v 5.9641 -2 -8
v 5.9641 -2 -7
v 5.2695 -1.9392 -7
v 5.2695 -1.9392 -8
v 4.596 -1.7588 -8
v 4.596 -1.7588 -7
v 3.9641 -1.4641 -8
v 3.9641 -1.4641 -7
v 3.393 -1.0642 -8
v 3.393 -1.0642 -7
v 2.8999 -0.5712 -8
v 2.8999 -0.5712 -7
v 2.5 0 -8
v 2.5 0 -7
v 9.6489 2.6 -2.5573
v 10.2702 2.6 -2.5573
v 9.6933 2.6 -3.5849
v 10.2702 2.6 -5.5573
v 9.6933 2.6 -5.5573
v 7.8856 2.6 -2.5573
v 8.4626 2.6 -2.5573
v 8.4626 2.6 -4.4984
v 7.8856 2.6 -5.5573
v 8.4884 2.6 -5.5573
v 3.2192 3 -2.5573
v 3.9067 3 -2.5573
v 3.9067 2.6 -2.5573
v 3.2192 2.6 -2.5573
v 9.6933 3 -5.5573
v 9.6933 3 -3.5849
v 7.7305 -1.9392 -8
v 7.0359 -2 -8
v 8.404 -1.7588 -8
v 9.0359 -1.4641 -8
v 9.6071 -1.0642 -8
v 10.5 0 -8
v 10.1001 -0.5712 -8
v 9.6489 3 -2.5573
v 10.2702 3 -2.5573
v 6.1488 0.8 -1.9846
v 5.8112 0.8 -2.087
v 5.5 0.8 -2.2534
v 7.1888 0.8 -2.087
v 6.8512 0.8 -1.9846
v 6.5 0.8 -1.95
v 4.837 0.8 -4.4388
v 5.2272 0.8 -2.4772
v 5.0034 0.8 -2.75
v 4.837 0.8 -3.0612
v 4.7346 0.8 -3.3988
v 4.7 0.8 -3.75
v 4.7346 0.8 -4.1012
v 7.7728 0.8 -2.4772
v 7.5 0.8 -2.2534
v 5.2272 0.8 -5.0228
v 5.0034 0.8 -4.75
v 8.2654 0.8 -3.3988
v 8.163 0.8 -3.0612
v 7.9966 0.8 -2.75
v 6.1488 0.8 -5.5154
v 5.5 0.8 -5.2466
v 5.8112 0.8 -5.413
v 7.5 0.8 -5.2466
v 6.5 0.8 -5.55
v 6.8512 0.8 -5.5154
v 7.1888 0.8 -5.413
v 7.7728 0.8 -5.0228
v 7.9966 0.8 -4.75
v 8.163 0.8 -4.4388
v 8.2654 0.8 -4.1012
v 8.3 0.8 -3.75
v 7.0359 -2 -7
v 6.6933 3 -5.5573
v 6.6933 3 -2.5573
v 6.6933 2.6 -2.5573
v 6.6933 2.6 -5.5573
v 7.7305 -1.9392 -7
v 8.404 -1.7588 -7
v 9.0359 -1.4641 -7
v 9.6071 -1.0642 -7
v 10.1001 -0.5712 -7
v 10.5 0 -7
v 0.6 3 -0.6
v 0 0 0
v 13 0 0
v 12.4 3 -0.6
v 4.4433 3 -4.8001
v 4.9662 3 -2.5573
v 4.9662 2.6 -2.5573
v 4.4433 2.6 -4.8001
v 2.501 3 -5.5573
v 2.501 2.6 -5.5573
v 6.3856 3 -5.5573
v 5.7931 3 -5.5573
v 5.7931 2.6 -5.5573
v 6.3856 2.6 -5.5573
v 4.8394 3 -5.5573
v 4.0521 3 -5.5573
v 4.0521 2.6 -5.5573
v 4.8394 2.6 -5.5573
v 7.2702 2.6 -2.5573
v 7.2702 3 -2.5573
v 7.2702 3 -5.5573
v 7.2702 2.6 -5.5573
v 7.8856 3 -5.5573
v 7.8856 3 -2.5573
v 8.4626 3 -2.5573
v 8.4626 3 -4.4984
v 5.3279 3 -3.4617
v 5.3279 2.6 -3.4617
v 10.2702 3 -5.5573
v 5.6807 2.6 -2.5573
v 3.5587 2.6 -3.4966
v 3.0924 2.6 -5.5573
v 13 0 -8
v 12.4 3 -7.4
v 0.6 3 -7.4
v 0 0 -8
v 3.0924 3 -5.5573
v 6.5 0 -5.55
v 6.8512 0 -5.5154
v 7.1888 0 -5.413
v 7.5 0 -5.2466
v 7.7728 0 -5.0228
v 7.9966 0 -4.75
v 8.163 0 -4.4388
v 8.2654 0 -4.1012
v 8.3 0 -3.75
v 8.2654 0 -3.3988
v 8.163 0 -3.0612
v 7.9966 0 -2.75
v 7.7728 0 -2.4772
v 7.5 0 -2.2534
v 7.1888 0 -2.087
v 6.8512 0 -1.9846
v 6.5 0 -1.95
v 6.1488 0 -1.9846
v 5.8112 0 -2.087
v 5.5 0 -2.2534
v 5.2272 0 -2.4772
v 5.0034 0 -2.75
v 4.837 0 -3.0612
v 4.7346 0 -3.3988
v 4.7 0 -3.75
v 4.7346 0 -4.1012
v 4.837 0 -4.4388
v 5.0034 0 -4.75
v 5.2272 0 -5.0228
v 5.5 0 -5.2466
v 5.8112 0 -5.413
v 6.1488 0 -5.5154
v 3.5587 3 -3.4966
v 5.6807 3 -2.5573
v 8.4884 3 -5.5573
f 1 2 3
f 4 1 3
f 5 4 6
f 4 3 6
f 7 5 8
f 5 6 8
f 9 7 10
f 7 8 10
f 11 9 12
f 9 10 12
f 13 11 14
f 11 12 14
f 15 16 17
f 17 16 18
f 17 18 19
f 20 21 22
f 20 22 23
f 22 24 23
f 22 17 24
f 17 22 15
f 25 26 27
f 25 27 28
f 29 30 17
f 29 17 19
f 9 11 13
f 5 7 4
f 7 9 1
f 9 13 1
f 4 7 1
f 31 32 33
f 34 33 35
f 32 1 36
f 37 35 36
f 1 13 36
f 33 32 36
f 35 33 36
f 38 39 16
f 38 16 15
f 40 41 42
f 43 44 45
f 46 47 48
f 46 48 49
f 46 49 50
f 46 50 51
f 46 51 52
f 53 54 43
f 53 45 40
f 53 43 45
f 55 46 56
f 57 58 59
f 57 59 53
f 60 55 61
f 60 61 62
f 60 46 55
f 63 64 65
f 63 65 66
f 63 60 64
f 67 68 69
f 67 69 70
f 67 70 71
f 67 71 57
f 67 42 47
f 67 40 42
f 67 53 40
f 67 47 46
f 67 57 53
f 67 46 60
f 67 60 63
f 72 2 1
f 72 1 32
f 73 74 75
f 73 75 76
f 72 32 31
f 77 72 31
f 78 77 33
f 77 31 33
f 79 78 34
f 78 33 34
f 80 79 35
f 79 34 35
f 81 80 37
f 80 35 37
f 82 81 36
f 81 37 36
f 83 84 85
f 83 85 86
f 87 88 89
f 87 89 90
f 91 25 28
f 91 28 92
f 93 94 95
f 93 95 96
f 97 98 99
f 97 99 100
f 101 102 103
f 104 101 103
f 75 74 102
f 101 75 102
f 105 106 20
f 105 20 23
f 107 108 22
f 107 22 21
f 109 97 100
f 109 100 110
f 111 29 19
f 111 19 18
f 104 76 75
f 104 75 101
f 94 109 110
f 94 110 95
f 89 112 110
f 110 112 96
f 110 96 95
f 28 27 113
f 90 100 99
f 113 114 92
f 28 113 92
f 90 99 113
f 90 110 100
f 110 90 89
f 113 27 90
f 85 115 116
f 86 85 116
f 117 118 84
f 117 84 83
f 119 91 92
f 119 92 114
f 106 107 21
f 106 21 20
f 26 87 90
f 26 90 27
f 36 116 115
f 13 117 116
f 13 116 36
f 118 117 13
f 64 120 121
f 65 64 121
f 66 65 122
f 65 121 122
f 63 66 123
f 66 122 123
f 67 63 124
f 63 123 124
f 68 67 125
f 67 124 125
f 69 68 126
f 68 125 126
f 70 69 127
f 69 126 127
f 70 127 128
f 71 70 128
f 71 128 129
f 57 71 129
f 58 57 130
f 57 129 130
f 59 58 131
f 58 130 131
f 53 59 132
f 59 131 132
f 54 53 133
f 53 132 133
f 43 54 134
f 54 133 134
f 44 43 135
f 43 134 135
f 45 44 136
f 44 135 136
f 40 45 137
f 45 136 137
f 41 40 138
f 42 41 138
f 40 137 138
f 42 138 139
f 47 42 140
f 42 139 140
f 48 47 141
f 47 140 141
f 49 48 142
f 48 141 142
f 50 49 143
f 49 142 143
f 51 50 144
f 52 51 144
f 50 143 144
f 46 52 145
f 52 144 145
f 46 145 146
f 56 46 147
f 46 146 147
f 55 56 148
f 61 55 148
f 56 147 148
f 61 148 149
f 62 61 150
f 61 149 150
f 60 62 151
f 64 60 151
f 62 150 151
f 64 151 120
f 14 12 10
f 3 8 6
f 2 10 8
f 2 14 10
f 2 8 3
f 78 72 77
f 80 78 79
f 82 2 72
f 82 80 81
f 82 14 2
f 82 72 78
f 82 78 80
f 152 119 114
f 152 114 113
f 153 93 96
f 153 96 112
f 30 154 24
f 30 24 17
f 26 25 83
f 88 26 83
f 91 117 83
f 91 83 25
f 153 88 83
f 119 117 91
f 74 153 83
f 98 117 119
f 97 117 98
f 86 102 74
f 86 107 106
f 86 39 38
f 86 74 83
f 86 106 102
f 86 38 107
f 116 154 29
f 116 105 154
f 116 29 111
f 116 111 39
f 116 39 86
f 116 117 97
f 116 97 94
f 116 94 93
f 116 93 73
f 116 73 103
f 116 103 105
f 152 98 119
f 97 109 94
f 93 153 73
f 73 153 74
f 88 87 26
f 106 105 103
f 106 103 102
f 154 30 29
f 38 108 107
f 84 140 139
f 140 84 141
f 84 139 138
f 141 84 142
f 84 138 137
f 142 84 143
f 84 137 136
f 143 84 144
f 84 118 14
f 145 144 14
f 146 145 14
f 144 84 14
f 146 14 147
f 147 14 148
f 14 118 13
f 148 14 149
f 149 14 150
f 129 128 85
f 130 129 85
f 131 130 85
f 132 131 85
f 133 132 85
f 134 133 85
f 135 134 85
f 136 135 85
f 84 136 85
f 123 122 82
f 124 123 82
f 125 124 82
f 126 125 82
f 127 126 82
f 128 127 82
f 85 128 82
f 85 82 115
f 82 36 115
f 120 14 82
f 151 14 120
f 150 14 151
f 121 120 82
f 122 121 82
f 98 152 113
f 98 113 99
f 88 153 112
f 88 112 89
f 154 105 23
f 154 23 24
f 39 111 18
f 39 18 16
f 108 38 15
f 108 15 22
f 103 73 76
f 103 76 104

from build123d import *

# Parameters (mm, degrees)
SKETCH1_W               = 13
SKETCH1_H               = 8
BOSS_EXTRUDE1_DEPTH     = 3
CUT_EXTRUDE1_DEPTH      = 16.556349186
CUT_EXTRUDE1_DEPTH_BACK = 16.556349186
CUT_EXTRUDE2_DEPTH      = 16.556349186
CUT_EXTRUDE2_DEPTH_BACK = 16.556349186
SKETCH4_R               = 1.8
CUT_EXTRUDE3_DEPTH      = 0.8
SKETCH5_W               = 8
SKETCH5_H               = 1
BOSS_EXTRUDE2_DEPTH     = 2
FILLET1_R               = 4
SKETCH6_W               = 0.576923077
SKETCH6_H               = 3
CUT_EXTRUDE4_DEPTH      = 0.4


with BuildPart() as part:
    # Sketch1 → Boss-Extrude1 (new body)
    with BuildSketch(Plane(origin=(0, 0, 0), x_dir=(1, 0, 0), z_dir=(0, 1, 0))):
        with Locations((6.5, 4)):
            Rectangle(SKETCH1_W, SKETCH1_H)
    extrude(amount=BOSS_EXTRUDE1_DEPTH)

    # Sketch2 → Cut-Extrude1 (cut, two sides: drawn at the far end of the back side and taken through both)
    with BuildSketch(Plane.XY.offset(-CUT_EXTRUDE1_DEPTH_BACK)):
        Polygon((0, 0), (0.6, 3), (0, 3), align=None)
        Polygon((13, 0), (12.4, 3), (13, 3), align=None)
    extrude(amount=CUT_EXTRUDE1_DEPTH + CUT_EXTRUDE1_DEPTH_BACK, mode=Mode.SUBTRACT)

    # Sketch3 → Cut-Extrude2 (cut, two sides: drawn at the far end of the back side and taken through both)
    with BuildSketch(Plane(origin=(0, 0, 0), x_dir=(0, 0, -1), z_dir=(1, 0, 0)).offset(-CUT_EXTRUDE2_DEPTH_BACK)):
        Polygon((0, 0), (0.6, 3), (0, 3), align=None)
        Polygon((8, 3), (7.4, 3), (8, 0), align=None)
    extrude(amount=CUT_EXTRUDE2_DEPTH + CUT_EXTRUDE2_DEPTH_BACK, mode=Mode.SUBTRACT)

    # Sketch4 → Cut-Extrude3 (cut)
    with BuildSketch(Plane.XZ):
        with Locations(Location((6.50000125, -3.75, 0), (0, 0, 270))):
            Circle(SKETCH4_R)
    extrude(amount=-CUT_EXTRUDE3_DEPTH, mode=Mode.SUBTRACT)

    # Sketch5 → Boss-Extrude2 (add)
    with BuildSketch(Plane.XZ):
        with Locations((6.500011, -7.5)):
            Rectangle(SKETCH5_W, SKETCH5_H)
    extrude(amount=BOSS_EXTRUDE2_DEPTH)

    # Fillet1
    # the kernel refuses this fillet: 4 mm, written as the material it takes off along each edge
    with BuildSketch(Plane(origin=(10.500011, -2, -16.660254038), x_dir=(0, 1, 0), z_dir=(0, 0, 1)), Plane(origin=(2.500011, -2, 1.660254038), x_dir=(0, 1, 0), z_dir=(0, 0, -1))) as fillet1_piece_1:
        with BuildLine():
            CenterArc((4, 3.464101615), FILLET1_R, 180, 60)
            Line((0, 3.464101615), (-0.08, 3.464101615))
            Line((-0.08, 3.464101615), (-0.08, 0))
            Line((-0.08, 0), (0, -0.08))
            ThreePointArc((0, -0.08), (1, -0.08), (1.96, -0.069282032))
            Line((1.96, -0.069282032), (2, 0))
        make_face()
    extrude(amount=18.320508076, mode=Mode.SUBTRACT)

    # Sketch6 → Cut-Extrude4 (cut)
    with BuildSketch(Plane(origin=(0, 3, 0), x_dir=(1, 0, 0), z_dir=(0, 1, 0))):
        Polygon((3.219165588, 2.557267472), (2.50101655, 5.557267472), (3.092362704, 5.557267472), (3.558708858, 3.496570357), (4.052098281, 5.557267472), (4.839357896, 5.557267472), (5.327939627, 3.461714587), (5.793083858, 5.557267472), (6.385631934, 5.557267472), (5.68070405, 2.557267472), (4.966160781, 2.557267472), (4.443324242, 4.800055934), (3.906665588, 2.557267472), align=None)
        with Locations((6.981785781, 4.057267472)):
            Rectangle(SKETCH6_W, SKETCH6_H)
        Polygon((7.885631934, 2.557267472), (7.885631934, 5.557267472), (8.488396358, 5.557267472), (9.693324242, 3.584911703), (9.693324242, 5.557267472), (10.270247319, 5.557267472), (10.270247319, 2.557267472), (9.648853088, 2.557267472), (8.462555011, 4.498373241), (8.462555011, 2.557267472), align=None)
    extrude(amount=-CUT_EXTRUDE4_DEPTH, mode=Mode.SUBTRACT)


solid = part.part
